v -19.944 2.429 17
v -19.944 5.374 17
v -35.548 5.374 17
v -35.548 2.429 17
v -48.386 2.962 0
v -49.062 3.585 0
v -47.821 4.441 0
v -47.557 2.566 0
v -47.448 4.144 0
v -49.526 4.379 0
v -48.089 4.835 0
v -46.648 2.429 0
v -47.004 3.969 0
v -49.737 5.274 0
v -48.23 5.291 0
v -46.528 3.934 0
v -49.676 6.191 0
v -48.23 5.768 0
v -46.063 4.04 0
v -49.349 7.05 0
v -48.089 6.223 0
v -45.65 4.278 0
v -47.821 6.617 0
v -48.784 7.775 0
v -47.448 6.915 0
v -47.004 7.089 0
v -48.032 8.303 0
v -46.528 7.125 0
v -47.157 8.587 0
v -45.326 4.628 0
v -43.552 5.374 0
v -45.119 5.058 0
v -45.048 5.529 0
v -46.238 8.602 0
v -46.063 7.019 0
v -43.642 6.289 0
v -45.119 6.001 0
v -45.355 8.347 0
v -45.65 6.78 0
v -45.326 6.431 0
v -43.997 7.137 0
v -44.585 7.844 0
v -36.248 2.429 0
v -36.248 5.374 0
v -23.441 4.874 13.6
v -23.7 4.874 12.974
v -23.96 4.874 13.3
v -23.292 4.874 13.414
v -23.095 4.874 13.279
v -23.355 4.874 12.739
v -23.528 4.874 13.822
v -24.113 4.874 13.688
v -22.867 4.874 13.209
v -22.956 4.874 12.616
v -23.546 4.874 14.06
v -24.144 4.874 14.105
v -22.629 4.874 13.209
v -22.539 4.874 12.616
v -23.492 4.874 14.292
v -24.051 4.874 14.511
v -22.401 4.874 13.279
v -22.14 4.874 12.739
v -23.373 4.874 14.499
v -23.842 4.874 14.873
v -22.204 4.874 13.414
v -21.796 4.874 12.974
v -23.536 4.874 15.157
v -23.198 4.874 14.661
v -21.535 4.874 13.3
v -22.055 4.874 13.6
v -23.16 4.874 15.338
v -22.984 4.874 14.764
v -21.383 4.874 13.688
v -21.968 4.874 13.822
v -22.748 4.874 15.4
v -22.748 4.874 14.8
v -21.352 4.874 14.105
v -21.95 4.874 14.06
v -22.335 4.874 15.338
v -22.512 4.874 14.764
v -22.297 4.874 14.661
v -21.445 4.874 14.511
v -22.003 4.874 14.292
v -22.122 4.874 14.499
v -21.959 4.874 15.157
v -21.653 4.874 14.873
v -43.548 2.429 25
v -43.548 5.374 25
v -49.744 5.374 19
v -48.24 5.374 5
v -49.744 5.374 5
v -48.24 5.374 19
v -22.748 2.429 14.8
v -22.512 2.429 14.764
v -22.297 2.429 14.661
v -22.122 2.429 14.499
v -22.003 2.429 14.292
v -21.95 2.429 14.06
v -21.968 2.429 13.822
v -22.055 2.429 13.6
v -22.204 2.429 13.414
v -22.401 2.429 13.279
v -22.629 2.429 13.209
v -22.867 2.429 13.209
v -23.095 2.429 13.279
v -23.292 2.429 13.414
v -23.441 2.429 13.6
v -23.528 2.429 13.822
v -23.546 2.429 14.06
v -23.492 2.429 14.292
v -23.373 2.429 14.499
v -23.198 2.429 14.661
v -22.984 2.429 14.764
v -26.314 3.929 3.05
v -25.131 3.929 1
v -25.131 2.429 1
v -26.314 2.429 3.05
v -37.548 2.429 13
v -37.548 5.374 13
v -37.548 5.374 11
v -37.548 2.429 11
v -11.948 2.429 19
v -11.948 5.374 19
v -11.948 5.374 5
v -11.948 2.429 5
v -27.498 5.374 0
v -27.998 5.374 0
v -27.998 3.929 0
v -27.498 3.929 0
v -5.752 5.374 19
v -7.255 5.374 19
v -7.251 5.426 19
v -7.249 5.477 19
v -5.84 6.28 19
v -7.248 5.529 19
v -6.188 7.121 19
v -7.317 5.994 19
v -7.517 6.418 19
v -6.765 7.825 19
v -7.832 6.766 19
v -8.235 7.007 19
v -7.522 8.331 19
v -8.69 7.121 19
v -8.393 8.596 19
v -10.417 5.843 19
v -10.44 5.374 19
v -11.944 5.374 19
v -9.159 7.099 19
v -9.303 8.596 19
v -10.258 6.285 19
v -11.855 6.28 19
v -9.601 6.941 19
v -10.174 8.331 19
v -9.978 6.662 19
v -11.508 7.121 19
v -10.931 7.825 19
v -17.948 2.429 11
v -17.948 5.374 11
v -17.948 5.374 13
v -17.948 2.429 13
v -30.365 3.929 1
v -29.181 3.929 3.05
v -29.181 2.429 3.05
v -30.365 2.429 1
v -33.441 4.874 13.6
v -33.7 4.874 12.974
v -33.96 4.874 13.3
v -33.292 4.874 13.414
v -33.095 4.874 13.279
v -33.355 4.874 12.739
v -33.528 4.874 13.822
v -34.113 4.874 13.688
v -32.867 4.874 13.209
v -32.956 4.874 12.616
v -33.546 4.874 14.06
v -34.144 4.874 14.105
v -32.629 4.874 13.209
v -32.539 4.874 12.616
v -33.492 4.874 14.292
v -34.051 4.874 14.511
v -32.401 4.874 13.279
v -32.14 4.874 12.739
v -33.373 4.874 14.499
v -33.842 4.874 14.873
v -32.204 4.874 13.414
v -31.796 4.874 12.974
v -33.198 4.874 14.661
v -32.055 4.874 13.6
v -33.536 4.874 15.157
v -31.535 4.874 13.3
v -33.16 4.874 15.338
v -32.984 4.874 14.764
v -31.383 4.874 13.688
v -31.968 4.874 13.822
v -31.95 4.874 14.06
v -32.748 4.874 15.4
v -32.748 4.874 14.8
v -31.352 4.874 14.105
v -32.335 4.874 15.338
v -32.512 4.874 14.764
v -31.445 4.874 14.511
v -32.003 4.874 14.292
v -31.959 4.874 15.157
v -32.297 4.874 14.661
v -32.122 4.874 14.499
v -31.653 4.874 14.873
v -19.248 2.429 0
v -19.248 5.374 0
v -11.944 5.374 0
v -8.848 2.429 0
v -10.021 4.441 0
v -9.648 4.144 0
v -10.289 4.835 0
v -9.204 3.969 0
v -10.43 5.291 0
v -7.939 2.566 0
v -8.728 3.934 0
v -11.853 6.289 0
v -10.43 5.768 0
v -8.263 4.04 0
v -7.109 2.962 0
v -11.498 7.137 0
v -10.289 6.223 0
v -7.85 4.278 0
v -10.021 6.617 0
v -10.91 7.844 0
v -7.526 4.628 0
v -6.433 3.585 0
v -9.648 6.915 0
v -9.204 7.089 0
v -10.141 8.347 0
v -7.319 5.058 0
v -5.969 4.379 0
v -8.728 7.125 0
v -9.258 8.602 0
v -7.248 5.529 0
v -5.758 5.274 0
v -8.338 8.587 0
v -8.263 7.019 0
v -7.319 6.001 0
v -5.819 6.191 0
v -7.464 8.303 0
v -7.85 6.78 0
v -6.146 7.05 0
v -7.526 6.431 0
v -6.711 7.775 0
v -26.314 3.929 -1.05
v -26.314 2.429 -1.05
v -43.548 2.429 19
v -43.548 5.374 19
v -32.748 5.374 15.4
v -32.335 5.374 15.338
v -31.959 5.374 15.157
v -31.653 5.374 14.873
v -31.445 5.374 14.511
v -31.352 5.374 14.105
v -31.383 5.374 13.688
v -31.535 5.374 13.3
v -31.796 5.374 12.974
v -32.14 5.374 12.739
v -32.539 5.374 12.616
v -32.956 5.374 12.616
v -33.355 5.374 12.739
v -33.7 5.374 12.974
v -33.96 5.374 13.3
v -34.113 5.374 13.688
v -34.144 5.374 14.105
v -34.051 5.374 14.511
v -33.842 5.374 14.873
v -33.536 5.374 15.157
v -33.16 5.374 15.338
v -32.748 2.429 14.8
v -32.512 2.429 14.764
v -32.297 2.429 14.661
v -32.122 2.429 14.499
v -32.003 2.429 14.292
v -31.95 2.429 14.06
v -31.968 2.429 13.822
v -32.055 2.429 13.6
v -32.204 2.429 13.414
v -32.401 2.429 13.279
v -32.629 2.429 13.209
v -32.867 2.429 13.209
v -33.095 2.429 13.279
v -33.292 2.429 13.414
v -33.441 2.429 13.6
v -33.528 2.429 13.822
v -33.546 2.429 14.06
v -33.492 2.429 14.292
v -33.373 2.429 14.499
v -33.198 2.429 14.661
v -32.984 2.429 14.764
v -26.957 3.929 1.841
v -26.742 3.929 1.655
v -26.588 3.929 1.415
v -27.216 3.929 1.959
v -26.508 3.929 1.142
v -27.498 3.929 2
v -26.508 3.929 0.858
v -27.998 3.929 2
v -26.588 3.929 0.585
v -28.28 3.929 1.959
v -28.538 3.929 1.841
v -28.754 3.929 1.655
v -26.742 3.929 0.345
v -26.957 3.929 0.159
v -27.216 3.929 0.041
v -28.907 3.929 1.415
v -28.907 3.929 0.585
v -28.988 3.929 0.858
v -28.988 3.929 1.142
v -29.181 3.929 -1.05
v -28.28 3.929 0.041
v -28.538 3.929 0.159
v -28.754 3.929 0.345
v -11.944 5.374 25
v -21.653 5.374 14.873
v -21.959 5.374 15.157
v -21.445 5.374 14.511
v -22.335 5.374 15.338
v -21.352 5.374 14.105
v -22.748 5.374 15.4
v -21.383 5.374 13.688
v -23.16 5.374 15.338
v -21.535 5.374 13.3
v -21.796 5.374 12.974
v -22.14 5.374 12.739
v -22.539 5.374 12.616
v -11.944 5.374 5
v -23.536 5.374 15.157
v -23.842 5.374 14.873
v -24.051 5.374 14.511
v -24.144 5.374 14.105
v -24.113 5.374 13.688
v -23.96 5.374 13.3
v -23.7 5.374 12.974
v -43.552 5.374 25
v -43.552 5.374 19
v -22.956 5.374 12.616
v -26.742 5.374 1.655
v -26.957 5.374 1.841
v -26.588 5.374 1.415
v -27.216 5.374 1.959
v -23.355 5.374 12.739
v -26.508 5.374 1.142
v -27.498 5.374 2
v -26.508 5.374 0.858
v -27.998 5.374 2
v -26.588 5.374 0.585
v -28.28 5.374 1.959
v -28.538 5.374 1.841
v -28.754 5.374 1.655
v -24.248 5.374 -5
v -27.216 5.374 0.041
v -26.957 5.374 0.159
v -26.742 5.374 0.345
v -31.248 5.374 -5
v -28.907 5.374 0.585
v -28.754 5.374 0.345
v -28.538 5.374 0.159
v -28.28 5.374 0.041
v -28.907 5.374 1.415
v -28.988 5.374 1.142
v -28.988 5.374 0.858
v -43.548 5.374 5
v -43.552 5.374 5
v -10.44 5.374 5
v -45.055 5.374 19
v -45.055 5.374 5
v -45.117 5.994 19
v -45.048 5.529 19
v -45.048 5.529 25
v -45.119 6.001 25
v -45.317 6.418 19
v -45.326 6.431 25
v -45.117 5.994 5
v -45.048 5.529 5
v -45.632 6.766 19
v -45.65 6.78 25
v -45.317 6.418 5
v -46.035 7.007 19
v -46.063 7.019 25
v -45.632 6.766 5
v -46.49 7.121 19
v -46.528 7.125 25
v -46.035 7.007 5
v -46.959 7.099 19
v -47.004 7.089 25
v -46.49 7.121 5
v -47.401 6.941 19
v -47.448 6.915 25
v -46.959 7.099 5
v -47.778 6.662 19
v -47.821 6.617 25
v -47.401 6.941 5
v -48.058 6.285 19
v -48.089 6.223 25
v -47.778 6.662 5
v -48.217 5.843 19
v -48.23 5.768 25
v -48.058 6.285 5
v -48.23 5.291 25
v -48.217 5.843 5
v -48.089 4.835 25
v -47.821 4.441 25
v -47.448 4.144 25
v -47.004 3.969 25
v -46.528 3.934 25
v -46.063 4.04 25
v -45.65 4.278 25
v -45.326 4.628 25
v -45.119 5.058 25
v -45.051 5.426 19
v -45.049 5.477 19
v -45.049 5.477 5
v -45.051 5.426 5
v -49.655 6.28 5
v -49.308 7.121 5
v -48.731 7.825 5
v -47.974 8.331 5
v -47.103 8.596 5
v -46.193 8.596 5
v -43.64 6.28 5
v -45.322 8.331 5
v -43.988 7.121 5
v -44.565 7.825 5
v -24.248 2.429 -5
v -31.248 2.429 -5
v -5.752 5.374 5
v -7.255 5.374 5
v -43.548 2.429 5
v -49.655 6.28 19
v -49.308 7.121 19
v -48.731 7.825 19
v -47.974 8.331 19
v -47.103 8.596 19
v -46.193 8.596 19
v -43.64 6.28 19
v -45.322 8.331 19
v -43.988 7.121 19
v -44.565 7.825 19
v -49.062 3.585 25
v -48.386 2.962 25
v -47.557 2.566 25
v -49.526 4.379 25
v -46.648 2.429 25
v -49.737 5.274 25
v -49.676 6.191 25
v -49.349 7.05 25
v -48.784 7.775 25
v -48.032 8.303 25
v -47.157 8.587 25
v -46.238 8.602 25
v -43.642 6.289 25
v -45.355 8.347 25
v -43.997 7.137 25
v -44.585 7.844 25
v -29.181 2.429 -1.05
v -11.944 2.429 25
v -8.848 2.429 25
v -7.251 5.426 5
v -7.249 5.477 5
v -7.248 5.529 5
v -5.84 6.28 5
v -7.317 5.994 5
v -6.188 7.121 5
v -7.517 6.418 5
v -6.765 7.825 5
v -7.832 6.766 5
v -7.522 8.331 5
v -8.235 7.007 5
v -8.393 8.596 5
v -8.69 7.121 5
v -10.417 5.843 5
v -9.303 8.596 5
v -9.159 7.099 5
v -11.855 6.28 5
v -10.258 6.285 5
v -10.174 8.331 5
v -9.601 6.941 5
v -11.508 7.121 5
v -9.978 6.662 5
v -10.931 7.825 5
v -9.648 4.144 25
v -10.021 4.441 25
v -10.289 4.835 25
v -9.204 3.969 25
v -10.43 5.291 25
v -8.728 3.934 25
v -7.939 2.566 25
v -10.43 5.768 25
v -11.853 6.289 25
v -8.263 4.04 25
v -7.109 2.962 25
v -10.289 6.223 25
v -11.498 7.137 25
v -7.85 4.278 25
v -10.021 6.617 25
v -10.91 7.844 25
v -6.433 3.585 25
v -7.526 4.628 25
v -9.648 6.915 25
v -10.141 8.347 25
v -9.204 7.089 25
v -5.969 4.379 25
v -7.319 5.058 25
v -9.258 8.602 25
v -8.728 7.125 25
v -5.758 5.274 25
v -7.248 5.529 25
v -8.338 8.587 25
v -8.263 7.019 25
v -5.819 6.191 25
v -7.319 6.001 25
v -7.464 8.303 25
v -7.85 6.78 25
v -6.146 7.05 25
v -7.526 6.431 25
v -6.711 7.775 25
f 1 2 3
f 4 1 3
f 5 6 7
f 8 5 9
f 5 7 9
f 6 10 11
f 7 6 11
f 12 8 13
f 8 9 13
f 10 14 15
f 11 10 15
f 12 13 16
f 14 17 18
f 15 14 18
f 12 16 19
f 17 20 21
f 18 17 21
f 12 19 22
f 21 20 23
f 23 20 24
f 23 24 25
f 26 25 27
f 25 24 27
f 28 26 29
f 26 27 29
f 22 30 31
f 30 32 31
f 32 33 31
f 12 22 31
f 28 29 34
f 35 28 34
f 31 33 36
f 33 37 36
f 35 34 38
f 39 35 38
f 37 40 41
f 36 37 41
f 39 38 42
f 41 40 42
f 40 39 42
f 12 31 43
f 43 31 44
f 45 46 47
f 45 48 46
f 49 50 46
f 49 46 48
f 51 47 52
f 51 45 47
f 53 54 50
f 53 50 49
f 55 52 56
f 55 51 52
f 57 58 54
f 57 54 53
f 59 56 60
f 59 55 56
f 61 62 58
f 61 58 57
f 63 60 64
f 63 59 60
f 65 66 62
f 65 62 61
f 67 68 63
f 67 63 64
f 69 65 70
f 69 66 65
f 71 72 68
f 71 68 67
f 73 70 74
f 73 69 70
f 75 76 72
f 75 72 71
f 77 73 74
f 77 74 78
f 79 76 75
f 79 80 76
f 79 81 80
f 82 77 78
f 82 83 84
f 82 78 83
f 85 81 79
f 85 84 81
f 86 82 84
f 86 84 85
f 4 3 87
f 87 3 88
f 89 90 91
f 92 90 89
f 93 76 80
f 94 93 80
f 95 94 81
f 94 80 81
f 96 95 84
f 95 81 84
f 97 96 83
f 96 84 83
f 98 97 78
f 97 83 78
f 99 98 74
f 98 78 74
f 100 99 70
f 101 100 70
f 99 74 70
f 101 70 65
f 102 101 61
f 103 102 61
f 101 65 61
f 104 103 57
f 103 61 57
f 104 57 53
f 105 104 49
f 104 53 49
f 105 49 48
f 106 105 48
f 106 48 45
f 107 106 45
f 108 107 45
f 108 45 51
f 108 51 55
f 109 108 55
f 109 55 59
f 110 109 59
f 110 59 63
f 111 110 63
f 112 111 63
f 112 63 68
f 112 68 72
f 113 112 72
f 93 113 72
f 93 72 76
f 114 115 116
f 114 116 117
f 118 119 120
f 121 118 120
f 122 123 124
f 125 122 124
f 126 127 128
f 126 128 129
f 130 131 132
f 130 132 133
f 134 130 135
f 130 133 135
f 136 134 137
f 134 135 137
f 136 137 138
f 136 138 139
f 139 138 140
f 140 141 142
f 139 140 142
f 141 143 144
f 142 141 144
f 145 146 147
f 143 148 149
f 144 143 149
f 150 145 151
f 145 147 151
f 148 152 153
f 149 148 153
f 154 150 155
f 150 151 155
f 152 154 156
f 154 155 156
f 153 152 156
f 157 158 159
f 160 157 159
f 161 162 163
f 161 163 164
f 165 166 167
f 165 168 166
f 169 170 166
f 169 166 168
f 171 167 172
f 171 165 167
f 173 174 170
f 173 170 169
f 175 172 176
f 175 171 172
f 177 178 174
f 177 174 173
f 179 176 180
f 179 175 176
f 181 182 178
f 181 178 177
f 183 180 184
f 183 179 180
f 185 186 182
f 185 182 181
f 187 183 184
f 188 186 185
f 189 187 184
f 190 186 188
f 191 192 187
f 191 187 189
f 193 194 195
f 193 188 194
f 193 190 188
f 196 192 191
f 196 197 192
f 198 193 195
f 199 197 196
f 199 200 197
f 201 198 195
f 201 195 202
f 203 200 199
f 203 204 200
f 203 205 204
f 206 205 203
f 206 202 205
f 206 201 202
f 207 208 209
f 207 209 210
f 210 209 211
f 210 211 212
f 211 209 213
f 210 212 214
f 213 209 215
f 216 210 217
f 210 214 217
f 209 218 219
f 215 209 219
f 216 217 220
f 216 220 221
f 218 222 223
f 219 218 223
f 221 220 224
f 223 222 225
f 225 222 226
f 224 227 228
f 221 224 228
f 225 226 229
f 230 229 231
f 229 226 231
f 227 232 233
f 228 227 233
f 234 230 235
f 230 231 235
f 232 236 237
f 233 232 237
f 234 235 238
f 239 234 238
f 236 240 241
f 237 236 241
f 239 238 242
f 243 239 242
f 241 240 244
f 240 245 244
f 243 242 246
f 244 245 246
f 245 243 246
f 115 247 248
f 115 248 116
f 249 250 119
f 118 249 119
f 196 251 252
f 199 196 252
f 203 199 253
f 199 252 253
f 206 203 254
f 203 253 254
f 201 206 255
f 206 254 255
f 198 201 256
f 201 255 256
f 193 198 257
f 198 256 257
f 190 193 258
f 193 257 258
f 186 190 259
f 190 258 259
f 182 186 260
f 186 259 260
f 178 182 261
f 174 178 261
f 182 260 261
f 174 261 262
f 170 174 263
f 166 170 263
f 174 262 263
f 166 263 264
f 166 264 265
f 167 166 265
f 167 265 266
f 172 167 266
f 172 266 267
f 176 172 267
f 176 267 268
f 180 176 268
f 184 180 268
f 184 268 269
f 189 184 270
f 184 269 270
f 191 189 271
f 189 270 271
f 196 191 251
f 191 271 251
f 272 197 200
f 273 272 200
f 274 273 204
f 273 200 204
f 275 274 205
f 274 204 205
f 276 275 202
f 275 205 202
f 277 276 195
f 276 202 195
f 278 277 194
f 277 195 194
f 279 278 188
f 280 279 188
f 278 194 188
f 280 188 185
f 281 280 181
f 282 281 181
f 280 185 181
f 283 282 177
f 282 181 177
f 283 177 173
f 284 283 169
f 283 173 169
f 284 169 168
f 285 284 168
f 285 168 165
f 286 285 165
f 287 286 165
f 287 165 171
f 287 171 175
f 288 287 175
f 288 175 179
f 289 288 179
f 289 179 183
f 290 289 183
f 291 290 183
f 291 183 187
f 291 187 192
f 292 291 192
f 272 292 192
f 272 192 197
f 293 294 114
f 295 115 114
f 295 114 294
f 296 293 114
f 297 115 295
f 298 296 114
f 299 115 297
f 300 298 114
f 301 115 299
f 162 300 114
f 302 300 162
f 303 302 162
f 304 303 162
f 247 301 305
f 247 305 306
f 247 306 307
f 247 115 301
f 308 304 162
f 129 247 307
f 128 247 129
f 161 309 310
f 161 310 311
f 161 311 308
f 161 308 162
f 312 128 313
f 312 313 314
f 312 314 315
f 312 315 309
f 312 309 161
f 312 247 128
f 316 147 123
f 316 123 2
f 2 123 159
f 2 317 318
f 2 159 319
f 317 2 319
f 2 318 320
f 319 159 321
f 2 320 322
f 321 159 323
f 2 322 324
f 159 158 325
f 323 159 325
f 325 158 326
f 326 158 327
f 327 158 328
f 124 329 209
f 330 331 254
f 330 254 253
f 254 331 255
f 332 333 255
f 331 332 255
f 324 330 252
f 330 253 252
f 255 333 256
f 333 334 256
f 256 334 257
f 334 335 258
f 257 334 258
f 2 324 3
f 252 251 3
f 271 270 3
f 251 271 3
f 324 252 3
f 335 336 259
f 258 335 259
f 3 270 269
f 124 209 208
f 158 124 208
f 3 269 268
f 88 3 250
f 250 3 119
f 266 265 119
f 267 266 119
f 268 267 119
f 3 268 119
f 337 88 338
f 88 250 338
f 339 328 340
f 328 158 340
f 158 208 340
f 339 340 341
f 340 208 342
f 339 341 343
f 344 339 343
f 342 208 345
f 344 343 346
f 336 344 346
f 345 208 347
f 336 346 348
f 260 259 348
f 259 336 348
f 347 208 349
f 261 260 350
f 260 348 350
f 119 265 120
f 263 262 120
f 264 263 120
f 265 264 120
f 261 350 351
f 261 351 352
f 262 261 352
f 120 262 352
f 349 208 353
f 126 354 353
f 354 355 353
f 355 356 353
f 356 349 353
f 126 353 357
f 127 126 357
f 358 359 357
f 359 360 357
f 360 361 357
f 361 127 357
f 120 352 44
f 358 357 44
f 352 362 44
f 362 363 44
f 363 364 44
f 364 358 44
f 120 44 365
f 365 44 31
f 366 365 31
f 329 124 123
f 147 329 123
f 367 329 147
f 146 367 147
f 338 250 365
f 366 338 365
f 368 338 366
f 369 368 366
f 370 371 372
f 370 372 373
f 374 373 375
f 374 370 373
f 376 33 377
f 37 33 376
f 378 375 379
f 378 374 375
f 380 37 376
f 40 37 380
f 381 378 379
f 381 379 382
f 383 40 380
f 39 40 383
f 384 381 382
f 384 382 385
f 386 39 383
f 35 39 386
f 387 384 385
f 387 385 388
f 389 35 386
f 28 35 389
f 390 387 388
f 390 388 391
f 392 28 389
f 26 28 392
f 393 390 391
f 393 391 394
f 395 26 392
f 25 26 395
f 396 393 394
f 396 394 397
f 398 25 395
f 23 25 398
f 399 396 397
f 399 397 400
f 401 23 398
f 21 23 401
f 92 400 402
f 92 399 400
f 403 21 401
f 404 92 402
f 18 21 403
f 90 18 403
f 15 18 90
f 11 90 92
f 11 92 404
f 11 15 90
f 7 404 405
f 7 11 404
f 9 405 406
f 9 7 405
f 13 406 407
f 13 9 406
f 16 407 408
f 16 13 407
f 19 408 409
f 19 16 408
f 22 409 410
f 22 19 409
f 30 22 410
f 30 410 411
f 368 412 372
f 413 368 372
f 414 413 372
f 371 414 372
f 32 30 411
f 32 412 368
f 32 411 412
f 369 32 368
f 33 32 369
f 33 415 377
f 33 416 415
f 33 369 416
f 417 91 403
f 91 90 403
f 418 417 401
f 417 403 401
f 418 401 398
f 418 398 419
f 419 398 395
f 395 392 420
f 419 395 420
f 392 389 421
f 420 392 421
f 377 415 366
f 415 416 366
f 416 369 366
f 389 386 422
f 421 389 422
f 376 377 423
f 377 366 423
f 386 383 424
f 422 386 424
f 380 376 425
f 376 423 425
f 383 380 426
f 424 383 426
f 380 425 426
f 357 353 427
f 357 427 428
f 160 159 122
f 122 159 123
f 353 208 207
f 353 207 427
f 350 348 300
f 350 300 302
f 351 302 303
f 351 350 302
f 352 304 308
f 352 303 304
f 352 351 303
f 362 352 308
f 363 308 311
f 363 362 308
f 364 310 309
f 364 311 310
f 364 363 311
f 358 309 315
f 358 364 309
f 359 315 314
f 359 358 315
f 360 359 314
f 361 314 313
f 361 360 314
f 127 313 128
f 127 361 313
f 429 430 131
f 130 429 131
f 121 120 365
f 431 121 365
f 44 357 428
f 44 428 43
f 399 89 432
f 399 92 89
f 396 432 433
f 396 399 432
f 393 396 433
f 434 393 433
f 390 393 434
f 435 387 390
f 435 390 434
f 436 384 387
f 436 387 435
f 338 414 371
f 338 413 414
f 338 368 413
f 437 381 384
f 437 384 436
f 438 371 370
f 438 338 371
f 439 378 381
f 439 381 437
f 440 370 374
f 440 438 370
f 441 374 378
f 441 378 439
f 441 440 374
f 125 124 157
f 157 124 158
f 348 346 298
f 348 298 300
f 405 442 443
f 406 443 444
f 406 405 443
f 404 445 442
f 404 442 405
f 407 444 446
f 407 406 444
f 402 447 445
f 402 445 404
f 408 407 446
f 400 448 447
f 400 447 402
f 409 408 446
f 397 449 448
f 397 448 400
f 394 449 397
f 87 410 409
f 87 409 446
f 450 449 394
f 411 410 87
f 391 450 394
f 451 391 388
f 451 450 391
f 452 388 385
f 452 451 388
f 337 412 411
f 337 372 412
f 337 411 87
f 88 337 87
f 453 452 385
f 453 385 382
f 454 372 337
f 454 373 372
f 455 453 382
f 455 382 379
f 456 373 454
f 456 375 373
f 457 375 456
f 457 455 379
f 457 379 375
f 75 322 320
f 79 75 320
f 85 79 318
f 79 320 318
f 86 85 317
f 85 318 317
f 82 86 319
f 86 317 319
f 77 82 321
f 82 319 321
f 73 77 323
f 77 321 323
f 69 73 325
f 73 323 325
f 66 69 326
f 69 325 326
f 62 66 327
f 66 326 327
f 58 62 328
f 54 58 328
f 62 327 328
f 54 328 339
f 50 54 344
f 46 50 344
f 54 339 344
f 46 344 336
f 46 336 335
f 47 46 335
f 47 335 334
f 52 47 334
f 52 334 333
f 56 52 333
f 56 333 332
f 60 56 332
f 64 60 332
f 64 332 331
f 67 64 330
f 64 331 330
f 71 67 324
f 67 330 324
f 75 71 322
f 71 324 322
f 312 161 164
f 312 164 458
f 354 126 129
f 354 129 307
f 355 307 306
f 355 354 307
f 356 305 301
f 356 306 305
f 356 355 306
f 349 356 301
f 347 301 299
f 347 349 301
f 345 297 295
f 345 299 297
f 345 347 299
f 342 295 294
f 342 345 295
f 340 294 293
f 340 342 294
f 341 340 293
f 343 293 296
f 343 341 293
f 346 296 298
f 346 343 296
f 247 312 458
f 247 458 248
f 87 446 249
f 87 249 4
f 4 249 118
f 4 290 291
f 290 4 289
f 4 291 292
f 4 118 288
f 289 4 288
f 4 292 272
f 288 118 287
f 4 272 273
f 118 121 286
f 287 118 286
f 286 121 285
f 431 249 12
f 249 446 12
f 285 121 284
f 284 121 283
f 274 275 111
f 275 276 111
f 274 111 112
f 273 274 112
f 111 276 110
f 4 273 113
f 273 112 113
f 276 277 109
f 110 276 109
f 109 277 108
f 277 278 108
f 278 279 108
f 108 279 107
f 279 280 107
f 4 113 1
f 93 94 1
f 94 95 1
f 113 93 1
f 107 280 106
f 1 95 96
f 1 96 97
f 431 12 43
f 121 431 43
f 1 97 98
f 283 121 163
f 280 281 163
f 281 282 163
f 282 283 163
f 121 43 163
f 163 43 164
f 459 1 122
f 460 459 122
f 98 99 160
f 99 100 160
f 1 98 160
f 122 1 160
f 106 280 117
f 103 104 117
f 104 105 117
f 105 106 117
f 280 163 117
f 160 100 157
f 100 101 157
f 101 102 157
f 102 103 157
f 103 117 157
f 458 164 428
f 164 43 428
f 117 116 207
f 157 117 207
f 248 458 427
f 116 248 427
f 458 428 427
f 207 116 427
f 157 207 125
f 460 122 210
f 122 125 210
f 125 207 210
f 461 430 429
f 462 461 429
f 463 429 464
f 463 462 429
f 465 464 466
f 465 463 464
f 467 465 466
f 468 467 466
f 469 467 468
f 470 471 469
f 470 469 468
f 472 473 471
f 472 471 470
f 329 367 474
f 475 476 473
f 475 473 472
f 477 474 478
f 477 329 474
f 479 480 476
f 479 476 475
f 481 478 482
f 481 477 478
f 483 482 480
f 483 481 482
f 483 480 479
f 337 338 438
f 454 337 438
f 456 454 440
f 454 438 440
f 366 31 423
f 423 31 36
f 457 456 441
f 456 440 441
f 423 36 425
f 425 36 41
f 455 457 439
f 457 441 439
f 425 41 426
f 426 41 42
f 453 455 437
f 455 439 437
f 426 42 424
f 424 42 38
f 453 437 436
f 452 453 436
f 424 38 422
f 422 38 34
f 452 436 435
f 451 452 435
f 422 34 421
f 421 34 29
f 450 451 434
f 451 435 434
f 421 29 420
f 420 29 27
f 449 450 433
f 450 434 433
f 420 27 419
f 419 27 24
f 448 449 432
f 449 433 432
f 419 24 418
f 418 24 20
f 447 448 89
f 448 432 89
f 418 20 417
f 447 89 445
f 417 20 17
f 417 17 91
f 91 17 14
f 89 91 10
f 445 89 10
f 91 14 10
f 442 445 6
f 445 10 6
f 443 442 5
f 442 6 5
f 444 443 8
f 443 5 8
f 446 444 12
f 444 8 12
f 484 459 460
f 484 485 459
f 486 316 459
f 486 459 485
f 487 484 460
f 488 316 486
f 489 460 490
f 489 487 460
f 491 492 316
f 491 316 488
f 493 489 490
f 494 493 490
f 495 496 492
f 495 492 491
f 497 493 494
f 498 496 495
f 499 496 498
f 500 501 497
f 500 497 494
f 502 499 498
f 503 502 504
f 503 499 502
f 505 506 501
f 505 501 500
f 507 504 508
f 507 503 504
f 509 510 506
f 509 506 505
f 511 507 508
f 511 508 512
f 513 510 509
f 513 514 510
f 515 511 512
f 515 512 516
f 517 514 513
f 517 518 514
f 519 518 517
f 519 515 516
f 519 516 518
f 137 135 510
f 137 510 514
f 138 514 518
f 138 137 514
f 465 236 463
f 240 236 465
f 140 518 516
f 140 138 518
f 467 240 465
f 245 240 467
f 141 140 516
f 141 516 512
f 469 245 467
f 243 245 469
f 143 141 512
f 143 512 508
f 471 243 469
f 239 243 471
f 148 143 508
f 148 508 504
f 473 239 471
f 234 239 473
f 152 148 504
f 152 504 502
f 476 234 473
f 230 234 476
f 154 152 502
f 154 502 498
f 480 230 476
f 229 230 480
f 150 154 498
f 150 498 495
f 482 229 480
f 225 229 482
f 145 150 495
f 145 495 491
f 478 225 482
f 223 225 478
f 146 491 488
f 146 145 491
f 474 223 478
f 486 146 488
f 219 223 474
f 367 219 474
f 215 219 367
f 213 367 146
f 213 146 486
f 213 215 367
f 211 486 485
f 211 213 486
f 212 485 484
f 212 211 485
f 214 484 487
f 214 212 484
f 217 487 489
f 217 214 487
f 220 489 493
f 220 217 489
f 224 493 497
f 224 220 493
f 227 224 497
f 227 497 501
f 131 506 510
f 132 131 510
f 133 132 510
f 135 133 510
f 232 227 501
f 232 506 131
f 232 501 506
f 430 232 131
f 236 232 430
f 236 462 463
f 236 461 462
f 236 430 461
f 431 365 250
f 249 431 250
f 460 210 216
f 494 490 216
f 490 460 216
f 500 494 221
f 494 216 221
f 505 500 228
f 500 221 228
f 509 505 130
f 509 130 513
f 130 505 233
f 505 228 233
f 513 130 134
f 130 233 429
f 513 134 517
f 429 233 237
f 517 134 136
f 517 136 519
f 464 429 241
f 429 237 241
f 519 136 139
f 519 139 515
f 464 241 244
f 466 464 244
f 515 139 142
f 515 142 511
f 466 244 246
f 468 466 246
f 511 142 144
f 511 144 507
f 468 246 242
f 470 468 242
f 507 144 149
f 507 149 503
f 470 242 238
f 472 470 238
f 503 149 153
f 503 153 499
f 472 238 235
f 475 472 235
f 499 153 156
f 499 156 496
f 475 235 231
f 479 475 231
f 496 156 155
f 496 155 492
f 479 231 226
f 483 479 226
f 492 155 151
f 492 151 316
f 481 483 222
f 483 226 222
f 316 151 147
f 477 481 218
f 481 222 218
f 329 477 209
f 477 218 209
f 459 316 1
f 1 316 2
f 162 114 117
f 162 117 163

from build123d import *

# Parameters (mm, degrees)
SKETCH_1_R           = 3.1
SKETCH_1_R_2         = 1.6
EXTRUDE_1_DEPTH      = 25
EXTRUDE_2_DEPTH      = 2.945
CUT_EXTRUDE_1_DEPTH  = 56.771287036
CUT_EXTRUDE_START    = -1.5
CUT_EXTRUDE_4_DEPTH  = 1.5
SKETCH_6_R           = 0.8
CUT_EXTRUDE_5_DEPTH  = 56.771287036
CUT_EXTRUDE_6_DEPTH  = 56.771287036
SKETCH_9_W           = 14
SKETCH_9_H           = 3.255
CUT_EXTRUDE_9_DEPTH  = 47.133536551
SKETCH_10_R          = 1.4
CUT_EXTRUDE_11_DEPTH = 0.5


with BuildPart() as part:
    # 草图1 → 凸台-拉伸1 (new body)
    # profile 1 of 3: a face of its own
    with BuildSketch(Plane.XY):
        with Locations((-46.647778168, 5.529205914)):
            Circle(SKETCH_1_R)
        with Locations((-46.647778168, 5.529205914)):
            Circle(SKETCH_1_R_2, mode=Mode.SUBTRACT)
    # profile 2 of 3: a face of its own
    with BuildSketch(Plane.XY):
        with BuildLine():
            ThreePointArc((-43.551655593, 5.374205914), (-44.511250611, 3.283042519), (-46.647778168, 2.429205914))
            Line((-46.647778168, 2.429205914), (-8.847778168, 2.429205914))
            ThreePointArc((-8.847778168, 2.429205914), (-10.984305724, 3.283042519), (-11.943900743, 5.374205914))
            Line((-11.943900743, 5.374205914), (-43.551655593, 5.374205914))
        make_face()
    # profile 3 of 3: a face of its own
    with BuildSketch(Plane.XY):
        with Locations((-8.847778168, 5.529205914)):
            Circle(SKETCH_1_R)
        with Locations((-8.847778168, 5.529205914)):
            Circle(SKETCH_1_R_2, mode=Mode.SUBTRACT)
    extrude(amount=EXTRUDE_1_DEPTH)

    # 草图2 → 凸台-拉伸2 (add)
    with BuildSketch(Plane(origin=(0, 5.374205914, 0), x_dir=(1, 0, 0), z_dir=(0, 1, 0))):
        Polygon((-19.247778168, 0), (-24.247778168, 5), (-31.247778168, 5), (-36.247778168, 0), align=None)
    extrude(amount=-EXTRUDE_2_DEPTH)

    # 草图3 → 切除-拉伸1 (cut, through all)
    with BuildSketch(Plane(origin=(0, 5.374205914, 0), x_dir=(1, 0, 0), z_dir=(0, 1, 0))):
        with BuildLine():
            Line((-27.997778168, 0), (-27.497778168, 0))
            ThreePointArc((-27.497778168, 0), (-26.497778168, -1), (-27.497778168, -2))
            Line((-27.497778168, -2), (-27.997778168, -2))
            ThreePointArc((-27.997778168, -2), (-28.997778168, -1), (-27.997778168, 0))
        make_face()
    extrude(amount=-CUT_EXTRUDE_1_DEPTH, mode=Mode.SUBTRACT)

    # 草图5 → 切除-拉伸4 (cut)
    # profile 1 of 3: a face of its own
    with BuildSketch(Plane(origin=(0, 2.429205914, 0), x_dir=(-1, 0, 0), z_dir=(0, -1, 0)).offset(CUT_EXTRUDE_START)):
        Polygon((25.630642064, -1), (26.814210116, 1.05), (26.314210116, 1.05), (25.130642064, -1), (26.314210116, -3.05), (26.814210116, -3.05), align=None)
    # profile 2 of 3: a face of its own
    with BuildSketch(Plane(origin=(0, 2.429205914, 0), x_dir=(-1, 0, 0), z_dir=(0, -1, 0)).offset(CUT_EXTRUDE_START)):
        Polygon((28.68134622, -3.05), (29.864914271, -1), (28.68134622, 1.05), (26.814210116, 1.05), (25.630642064, -1), (26.814210116, -3.05), align=None)
        with BuildLine():
            ThreePointArc((27.497778168, -2), (26.497778168, -1), (27.497778168, 0))
            Line((27.497778168, 0), (27.997778168, 0))
            ThreePointArc((27.997778168, 0), (28.997778168, -1), (27.997778168, -2))
            Line((27.997778168, -2), (27.497778168, -2))
        make_face(mode=Mode.SUBTRACT)
    # profile 3 of 3: a face of its own
    with BuildSketch(Plane(origin=(0, 2.429205914, 0), x_dir=(-1, 0, 0), z_dir=(0, -1, 0)).offset(CUT_EXTRUDE_START)):
        Polygon((28.68134622, 1.05), (29.864914271, -1), (28.68134622, -3.05), (29.18134622, -3.05), (30.364914271, -1), (29.18134622, 1.05), align=None)
    extrude(amount=CUT_EXTRUDE_4_DEPTH, mode=Mode.SUBTRACT)

    # 草图6 → 切除-拉伸5 (cut, through all)
    with BuildSketch(Plane(origin=(0, 5.374205914, 0), x_dir=(1, 0, 0), z_dir=(0, 1, 0))):
        with Locations(Location((-32.747778168, -14, 0), (0, 0, 270))):
            Circle(SKETCH_6_R)
        with Locations(Location((-22.747778168, -14, 0), (0, 0, 270))):
            Circle(SKETCH_6_R)
    extrude(amount=-CUT_EXTRUDE_5_DEPTH, mode=Mode.SUBTRACT)

    # 草图7 → 切除-拉伸6 (cut, through all)
    with BuildSketch(Plane(origin=(0, 5.374205914, 0), x_dir=(1, 0, 0), z_dir=(0, 1, 0))):
        Polygon((-35.547778168, -17), (-43.547778168, -25), (-11.943900743, -25), (-19.943900743, -17), align=None)
        Polygon((-37.547778168, -13), (-37.547778168, -11), (-43.547778168, -5), (-43.547778168, -19), align=None)
        Polygon((-11.947778168, -5), (-17.947778168, -11), (-17.947778168, -13), (-11.947778168, -19), align=None)
    extrude(amount=-CUT_EXTRUDE_6_DEPTH, mode=Mode.SUBTRACT)

    # 草图9 → 切除-拉伸9 (cut, through all)
    with BuildSketch(Plane.ZY.offset(11.947778168)):
        with Locations((12, 7.001705914)):
            Rectangle(SKETCH_9_W, SKETCH_9_H)
    cut_extrude_9 = extrude(amount=-CUT_EXTRUDE_9_DEPTH, mode=Mode.SUBTRACT)

    # 镜向1: 切除-拉伸9 across plane
    add(cut_extrude_9.mirror(Plane(origin=(-27.747778168, 0, 0), x_dir=(0, 0, 1), z_dir=(1, 0, 0))), mode=Mode.SUBTRACT)

    # 草图10 → 切除-拉伸11 (cut)
    with BuildSketch(Plane(origin=(0, 5.374205914, 0), x_dir=(1, 0, 0), z_dir=(0, 1, 0))):
        with Locations(Location((-22.747778168, -14, 0), (0, 0, 270))):
            Circle(SKETCH_10_R)
        with Locations(Location((-32.747778168, -14, 0), (0, 0, 270))):
            Circle(SKETCH_10_R)
    extrude(amount=-CUT_EXTRUDE_11_DEPTH, mode=Mode.SUBTRACT)


solid = part.part
